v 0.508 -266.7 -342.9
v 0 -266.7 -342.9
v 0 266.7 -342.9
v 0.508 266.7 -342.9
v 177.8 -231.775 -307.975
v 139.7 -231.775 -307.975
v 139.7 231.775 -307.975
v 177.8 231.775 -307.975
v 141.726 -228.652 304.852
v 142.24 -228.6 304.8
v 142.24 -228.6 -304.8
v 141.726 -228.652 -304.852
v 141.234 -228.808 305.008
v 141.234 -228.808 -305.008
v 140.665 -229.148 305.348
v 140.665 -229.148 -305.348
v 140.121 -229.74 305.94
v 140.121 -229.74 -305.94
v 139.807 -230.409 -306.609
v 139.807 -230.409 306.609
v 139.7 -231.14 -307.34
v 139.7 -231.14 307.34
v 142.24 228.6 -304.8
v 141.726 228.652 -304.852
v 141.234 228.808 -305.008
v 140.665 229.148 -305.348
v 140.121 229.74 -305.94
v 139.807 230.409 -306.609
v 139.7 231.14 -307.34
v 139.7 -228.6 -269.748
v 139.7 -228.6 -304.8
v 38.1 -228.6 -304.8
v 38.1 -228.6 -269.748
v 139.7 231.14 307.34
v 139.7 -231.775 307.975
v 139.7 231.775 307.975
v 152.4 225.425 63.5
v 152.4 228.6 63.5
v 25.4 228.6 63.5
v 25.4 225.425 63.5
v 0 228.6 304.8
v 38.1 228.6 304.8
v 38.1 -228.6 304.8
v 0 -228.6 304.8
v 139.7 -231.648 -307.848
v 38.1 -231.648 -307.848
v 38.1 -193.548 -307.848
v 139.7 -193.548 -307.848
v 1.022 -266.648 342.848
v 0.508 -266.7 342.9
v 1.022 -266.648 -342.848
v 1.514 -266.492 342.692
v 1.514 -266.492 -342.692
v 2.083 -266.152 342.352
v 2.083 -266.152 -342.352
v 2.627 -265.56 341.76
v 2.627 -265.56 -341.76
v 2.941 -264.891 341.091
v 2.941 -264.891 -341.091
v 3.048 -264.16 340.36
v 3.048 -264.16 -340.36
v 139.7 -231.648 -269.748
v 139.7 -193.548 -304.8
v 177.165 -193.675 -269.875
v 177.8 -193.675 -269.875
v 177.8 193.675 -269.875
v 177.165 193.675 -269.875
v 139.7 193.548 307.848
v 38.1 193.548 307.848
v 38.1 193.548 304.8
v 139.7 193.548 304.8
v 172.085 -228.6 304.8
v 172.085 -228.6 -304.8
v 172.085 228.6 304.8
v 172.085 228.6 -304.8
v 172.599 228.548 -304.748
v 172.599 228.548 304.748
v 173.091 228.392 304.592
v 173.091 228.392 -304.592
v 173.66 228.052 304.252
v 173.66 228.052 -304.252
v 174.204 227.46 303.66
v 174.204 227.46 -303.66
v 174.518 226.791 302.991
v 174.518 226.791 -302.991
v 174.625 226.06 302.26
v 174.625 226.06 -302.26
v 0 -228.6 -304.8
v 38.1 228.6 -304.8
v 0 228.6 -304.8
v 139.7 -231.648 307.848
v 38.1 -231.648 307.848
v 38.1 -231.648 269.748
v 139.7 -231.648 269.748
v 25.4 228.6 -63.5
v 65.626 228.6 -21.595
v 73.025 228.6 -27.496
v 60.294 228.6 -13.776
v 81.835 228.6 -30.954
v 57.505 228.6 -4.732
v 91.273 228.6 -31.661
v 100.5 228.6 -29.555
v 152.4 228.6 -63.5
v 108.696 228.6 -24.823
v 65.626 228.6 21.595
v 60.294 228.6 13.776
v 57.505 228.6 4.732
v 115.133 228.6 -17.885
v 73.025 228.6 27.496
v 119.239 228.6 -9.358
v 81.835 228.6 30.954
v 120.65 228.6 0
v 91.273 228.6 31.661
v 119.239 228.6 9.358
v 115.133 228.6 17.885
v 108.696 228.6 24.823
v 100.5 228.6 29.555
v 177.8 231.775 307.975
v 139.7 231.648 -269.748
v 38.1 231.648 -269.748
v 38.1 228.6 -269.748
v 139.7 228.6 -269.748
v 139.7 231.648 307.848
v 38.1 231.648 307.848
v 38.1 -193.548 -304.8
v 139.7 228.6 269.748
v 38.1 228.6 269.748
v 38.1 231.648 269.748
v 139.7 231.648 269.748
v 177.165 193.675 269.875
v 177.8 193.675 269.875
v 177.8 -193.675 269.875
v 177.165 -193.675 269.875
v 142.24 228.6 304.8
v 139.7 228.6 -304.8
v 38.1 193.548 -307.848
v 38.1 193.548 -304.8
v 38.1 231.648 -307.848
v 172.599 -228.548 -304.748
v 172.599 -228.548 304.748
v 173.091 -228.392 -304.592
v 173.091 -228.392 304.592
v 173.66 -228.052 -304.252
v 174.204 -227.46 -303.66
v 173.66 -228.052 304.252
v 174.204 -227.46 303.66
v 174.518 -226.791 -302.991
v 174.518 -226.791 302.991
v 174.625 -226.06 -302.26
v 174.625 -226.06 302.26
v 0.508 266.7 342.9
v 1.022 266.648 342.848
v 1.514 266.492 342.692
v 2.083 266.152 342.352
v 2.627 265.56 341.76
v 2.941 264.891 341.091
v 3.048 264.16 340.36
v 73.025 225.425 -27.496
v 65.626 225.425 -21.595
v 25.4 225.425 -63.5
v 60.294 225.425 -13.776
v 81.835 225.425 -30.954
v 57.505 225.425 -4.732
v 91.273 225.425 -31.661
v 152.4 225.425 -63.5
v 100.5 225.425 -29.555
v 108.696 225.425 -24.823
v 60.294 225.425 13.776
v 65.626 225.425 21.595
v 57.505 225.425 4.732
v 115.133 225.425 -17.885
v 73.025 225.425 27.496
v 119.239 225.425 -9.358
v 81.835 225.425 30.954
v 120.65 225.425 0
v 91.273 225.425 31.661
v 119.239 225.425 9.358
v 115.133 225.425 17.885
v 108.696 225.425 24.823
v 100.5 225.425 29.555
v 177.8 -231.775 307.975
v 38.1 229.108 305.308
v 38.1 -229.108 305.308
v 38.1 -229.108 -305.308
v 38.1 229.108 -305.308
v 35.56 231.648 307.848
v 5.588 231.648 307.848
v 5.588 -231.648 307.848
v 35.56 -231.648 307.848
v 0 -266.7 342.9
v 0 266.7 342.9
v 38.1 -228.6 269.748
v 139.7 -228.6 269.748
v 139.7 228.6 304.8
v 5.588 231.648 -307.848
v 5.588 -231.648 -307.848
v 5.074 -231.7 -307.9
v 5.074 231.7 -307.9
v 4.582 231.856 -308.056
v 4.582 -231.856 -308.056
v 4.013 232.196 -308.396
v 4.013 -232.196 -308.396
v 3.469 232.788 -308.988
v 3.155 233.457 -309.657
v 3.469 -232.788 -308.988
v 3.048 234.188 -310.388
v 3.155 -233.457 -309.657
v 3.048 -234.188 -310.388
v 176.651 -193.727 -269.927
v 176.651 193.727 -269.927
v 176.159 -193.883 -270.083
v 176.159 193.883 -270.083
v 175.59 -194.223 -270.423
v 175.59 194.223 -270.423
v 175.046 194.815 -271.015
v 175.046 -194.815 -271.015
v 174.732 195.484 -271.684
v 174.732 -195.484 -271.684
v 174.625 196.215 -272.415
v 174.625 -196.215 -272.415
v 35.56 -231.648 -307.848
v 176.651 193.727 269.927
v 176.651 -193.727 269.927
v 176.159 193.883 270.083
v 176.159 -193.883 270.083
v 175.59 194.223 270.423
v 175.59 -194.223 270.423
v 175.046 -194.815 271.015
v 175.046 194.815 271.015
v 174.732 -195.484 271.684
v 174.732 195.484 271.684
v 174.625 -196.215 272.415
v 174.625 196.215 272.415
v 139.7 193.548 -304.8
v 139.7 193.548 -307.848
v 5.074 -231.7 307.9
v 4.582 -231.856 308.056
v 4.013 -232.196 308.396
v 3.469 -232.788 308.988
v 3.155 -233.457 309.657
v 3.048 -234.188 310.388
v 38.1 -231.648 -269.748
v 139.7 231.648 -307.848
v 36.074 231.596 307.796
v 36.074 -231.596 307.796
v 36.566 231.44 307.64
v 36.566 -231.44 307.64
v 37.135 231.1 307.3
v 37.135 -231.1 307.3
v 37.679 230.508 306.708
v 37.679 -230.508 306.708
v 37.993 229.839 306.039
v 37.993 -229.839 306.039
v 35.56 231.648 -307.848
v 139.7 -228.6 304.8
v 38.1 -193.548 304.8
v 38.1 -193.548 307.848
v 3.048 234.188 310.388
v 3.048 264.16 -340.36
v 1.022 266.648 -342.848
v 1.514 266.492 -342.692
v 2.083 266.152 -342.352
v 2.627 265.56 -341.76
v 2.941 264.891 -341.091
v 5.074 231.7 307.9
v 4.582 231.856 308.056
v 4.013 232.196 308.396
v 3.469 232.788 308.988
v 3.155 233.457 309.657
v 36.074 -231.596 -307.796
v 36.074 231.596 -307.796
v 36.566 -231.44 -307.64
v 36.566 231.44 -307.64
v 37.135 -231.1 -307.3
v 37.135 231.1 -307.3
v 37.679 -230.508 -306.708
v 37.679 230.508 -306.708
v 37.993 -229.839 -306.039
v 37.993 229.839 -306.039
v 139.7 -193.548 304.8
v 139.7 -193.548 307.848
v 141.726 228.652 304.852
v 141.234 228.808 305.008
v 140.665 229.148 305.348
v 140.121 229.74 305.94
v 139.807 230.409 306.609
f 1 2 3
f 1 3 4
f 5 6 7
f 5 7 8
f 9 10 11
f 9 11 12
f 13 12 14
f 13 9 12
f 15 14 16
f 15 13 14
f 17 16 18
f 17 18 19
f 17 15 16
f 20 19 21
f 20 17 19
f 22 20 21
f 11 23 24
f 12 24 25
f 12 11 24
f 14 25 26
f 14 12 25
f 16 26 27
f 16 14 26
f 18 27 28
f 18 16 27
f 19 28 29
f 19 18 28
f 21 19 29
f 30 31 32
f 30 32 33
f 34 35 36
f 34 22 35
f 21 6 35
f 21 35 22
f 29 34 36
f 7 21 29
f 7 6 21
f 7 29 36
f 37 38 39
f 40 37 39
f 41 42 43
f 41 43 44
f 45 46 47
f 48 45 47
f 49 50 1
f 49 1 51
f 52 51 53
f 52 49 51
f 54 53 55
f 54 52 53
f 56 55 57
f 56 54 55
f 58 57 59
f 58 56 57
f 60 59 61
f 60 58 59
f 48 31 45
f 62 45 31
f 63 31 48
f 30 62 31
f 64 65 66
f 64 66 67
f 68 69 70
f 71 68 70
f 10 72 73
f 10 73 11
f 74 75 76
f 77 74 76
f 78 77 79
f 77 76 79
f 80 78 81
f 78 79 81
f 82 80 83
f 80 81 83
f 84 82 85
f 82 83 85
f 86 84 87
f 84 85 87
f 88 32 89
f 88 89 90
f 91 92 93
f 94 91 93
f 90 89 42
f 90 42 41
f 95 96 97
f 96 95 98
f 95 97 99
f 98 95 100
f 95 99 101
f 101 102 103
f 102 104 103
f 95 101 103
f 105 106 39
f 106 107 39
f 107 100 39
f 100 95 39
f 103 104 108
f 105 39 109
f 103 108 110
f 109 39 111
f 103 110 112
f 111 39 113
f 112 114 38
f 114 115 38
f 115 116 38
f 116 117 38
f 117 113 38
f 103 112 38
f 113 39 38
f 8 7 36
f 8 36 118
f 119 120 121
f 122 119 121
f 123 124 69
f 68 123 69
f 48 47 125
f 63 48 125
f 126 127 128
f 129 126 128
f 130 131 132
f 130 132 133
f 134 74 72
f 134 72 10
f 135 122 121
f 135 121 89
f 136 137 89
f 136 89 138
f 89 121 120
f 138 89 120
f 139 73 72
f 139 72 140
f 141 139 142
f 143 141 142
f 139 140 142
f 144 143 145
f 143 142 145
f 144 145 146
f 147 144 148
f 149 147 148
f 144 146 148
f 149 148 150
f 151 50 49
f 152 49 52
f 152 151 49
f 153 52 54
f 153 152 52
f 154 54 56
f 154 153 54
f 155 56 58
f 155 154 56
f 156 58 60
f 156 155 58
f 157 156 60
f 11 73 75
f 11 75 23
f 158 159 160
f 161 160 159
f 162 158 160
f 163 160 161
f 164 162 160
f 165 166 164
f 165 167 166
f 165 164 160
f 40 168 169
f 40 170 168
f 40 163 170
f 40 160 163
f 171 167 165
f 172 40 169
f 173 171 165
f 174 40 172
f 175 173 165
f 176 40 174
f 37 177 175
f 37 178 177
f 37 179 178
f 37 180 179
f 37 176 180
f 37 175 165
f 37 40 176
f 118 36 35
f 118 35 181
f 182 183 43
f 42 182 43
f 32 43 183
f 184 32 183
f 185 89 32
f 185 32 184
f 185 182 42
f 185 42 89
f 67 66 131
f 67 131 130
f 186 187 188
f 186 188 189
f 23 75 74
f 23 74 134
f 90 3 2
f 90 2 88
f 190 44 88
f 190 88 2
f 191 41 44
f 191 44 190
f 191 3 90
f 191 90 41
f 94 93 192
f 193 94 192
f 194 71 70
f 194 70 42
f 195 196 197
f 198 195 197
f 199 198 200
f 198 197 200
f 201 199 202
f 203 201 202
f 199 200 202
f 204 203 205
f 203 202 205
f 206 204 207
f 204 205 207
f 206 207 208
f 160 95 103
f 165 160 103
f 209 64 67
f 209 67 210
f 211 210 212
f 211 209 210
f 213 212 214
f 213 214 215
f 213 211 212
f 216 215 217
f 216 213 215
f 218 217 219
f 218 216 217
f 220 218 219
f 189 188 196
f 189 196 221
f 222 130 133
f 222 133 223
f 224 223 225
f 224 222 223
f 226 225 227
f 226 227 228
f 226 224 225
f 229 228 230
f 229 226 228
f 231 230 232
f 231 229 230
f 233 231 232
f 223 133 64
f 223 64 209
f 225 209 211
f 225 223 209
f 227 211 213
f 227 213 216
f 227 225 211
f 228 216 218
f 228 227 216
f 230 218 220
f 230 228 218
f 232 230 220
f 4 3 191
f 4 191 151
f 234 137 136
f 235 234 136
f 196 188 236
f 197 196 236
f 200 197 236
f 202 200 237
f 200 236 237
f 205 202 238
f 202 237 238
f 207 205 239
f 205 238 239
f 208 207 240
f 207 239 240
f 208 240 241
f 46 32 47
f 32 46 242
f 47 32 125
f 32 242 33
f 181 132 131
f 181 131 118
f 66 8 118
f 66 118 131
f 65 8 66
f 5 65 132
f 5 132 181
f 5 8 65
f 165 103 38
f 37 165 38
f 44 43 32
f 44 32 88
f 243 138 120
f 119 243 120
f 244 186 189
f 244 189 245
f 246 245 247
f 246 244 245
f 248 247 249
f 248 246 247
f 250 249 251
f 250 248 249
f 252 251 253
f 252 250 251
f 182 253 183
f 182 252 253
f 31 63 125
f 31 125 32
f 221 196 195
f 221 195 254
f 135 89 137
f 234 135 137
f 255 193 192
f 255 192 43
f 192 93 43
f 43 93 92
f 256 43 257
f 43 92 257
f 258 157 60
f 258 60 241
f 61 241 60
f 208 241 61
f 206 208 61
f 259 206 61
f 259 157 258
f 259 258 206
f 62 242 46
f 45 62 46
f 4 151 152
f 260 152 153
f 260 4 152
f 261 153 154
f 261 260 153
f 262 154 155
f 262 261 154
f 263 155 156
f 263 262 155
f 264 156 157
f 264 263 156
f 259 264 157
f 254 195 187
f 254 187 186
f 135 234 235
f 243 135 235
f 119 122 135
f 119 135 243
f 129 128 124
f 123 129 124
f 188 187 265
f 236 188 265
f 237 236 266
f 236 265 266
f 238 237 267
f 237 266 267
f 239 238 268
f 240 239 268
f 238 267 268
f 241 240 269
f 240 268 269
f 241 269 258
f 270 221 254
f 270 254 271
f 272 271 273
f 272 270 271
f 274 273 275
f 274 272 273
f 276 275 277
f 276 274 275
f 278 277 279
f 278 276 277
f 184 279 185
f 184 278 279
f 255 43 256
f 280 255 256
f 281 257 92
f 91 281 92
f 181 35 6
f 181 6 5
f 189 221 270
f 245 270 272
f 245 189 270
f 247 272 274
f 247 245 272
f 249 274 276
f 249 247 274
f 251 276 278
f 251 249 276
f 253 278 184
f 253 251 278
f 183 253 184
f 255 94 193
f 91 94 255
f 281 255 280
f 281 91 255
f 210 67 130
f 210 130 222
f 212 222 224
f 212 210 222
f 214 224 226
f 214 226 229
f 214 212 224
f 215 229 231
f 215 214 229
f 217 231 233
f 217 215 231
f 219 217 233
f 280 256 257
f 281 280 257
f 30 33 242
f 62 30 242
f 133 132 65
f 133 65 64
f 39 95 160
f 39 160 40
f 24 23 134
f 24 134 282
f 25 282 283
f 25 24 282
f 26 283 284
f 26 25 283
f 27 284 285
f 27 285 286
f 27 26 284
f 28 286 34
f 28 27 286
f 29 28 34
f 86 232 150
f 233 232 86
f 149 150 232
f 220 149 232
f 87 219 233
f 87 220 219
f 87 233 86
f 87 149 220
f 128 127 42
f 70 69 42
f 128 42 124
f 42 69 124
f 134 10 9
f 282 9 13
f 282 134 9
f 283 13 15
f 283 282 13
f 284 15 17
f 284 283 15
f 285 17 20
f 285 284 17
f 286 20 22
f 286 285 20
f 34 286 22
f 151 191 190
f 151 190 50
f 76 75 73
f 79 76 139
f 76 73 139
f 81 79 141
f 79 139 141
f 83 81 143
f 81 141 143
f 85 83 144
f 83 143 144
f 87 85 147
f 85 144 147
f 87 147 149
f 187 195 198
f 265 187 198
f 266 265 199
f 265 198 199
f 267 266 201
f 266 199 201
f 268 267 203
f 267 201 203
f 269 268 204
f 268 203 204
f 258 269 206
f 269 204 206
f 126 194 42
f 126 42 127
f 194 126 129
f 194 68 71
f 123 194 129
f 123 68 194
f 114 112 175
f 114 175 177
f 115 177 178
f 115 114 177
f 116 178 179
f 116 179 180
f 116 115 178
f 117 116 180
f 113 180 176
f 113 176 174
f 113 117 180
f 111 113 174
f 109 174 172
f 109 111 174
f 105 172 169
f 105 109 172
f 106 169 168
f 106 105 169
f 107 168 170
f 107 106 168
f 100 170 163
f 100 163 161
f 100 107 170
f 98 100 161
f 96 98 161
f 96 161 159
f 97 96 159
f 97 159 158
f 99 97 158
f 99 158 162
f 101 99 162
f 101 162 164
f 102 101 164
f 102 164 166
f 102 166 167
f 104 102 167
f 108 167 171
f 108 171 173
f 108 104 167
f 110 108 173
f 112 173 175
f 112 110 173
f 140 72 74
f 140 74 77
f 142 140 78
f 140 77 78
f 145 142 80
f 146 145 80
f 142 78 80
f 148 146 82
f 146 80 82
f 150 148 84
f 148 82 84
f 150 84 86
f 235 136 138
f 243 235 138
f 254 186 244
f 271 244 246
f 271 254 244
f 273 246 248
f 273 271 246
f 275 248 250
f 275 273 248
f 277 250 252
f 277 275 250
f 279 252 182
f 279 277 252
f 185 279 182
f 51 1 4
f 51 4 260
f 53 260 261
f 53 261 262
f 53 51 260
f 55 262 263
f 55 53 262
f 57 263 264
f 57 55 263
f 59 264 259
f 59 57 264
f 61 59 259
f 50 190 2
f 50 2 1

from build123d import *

# Parameters (mm, degrees)
F9_DEPTH  = 101.6
F10_W     = 114.3
F10_H     = 127
F10_R     = 31.75
F10_W_2   = 12.7
F11_DEPTH = 3.175


with BuildPart() as f2:
    # F2: sweep along a path in F0
    with BuildLine(Plane.YZ) as f2_path:
        Line((-228.6, 304.8), (228.6, 304.8))
        Line((228.6, 304.8), (228.6, -304.8))
        Line((228.6, -304.8), (-228.6, -304.8))
        Line((-228.6, -304.8), (-228.6, 304.8))
    # F1 (on Front) → F2 (sweep)
    with BuildSketch(Plane.XZ):
        with BuildLine():
            Line((38.1, -304.8), (0, -304.8))
            Line((0, -304.8), (0, -342.9))
            Line((0, -342.9), (0.508, -342.9))
            ThreePointArc((0.508, -342.9), (2.3040512242, -342.1560512242), (3.048, -340.36))
            Line((3.048, -340.36), (3.048, -310.388))
            ThreePointArc((3.048, -310.388), (3.7919487758, -308.5919487758), (5.588, -307.848))
            Line((5.588, -307.848), (35.56, -307.848))
            ThreePointArc((35.56, -307.848), (37.3560512242, -307.1040512242), (38.1, -305.308))
            Line((38.1, -305.308), (38.1, -304.8))
        make_face()
    sweep(path=f2_path.line, transition=Transition.RIGHT)


with BuildPart() as f6:
    # F6: sweep along a path in F4
    with BuildLine(Plane.YZ.offset(177.8)) as f6_path:
        Line((231.775, 307.975), (231.775, -307.975))
        Line((231.775, -307.975), (-231.775, -307.975))
        Line((-231.775, -307.975), (-231.775, 307.975))
        Line((-231.775, 307.975), (231.775, 307.975))
    # F5 (on Front) → F6 (sweep)
    with BuildSketch(Plane.XZ):
        with BuildLine():
            Line((139.7, -307.975), (177.8, -307.975))
            Line((177.8, -307.975), (177.8, -269.875))
            Line((177.8, -269.875), (177.165, -269.875))
            ThreePointArc((177.165, -269.875), (175.3689487758, -270.6189487758), (174.625, -272.415))
            Line((174.625, -272.415), (174.625, -302.26))
            ThreePointArc((174.625, -302.26), (173.8810512242, -304.0560512242), (172.085, -304.8))
            Line((172.085, -304.8), (142.24, -304.8))
            ThreePointArc((142.24, -304.8), (140.4439487758, -305.5439487758), (139.7, -307.34))
            Line((139.7, -307.34), (139.7, -307.975))
        make_face()
    sweep(path=f6_path.line, transition=Transition.RIGHT)


with BuildPart() as f9:
    # F8 (on offset) → F9 (new body)
    with BuildSketch(Plane.YZ.offset(38.1)):
        Polygon((-193.548, -304.8), (-228.6, -304.8), (-228.6, -269.748), (-231.648, -269.748), (-231.648, -307.848), (-193.548, -307.848), align=None)
    extrude(amount=F9_DEPTH)


with BuildPart() as f9b:
    # F8 (on offset) → F9, piece 2 (new body)
    with BuildSketch(Plane.YZ.offset(38.1)):
        Polygon((-228.6, 269.748), (-228.6, 304.8), (-193.548, 304.8), (-193.548, 307.848), (-231.648, 307.848), (-231.648, 269.748), align=None)
    extrude(amount=F9_DEPTH)


with BuildPart() as f9c:
    # F8 (on offset) → F9, piece 3 (new body)
    with BuildSketch(Plane.YZ.offset(38.1)):
        Polygon((228.6, -269.748), (228.6, -304.8), (193.548, -304.8), (193.548, -307.848), (231.648, -307.848), (231.648, -269.748), align=None)
    extrude(amount=F9_DEPTH)


with BuildPart() as f9d:
    # F8 (on offset) → F9, piece 4 (new body)
    with BuildSketch(Plane.YZ.offset(38.1)):
        Polygon((193.548, 304.8), (228.6, 304.8), (228.6, 269.748), (231.648, 269.748), (231.648, 307.848), (193.548, 307.848), align=None)
    extrude(amount=F9_DEPTH)


with BuildPart() as f11:
    # F10 (on face) → F11 (new body)
    with BuildSketch(Plane.XZ.offset(-228.6)):
        with Locations((95.25, 0)):
            Rectangle(F10_W, F10_H)
        with Locations((88.9, 0)):
            Circle(F10_R, mode=Mode.SUBTRACT)
        with Locations((31.75, 0)):
            Rectangle(F10_W_2, F10_H)
    extrude(amount=F11_DEPTH)


solid = Compound([f2.part, f6.part, f9.part, f9b.part, f9c.part, f9d.part, f11.part])
